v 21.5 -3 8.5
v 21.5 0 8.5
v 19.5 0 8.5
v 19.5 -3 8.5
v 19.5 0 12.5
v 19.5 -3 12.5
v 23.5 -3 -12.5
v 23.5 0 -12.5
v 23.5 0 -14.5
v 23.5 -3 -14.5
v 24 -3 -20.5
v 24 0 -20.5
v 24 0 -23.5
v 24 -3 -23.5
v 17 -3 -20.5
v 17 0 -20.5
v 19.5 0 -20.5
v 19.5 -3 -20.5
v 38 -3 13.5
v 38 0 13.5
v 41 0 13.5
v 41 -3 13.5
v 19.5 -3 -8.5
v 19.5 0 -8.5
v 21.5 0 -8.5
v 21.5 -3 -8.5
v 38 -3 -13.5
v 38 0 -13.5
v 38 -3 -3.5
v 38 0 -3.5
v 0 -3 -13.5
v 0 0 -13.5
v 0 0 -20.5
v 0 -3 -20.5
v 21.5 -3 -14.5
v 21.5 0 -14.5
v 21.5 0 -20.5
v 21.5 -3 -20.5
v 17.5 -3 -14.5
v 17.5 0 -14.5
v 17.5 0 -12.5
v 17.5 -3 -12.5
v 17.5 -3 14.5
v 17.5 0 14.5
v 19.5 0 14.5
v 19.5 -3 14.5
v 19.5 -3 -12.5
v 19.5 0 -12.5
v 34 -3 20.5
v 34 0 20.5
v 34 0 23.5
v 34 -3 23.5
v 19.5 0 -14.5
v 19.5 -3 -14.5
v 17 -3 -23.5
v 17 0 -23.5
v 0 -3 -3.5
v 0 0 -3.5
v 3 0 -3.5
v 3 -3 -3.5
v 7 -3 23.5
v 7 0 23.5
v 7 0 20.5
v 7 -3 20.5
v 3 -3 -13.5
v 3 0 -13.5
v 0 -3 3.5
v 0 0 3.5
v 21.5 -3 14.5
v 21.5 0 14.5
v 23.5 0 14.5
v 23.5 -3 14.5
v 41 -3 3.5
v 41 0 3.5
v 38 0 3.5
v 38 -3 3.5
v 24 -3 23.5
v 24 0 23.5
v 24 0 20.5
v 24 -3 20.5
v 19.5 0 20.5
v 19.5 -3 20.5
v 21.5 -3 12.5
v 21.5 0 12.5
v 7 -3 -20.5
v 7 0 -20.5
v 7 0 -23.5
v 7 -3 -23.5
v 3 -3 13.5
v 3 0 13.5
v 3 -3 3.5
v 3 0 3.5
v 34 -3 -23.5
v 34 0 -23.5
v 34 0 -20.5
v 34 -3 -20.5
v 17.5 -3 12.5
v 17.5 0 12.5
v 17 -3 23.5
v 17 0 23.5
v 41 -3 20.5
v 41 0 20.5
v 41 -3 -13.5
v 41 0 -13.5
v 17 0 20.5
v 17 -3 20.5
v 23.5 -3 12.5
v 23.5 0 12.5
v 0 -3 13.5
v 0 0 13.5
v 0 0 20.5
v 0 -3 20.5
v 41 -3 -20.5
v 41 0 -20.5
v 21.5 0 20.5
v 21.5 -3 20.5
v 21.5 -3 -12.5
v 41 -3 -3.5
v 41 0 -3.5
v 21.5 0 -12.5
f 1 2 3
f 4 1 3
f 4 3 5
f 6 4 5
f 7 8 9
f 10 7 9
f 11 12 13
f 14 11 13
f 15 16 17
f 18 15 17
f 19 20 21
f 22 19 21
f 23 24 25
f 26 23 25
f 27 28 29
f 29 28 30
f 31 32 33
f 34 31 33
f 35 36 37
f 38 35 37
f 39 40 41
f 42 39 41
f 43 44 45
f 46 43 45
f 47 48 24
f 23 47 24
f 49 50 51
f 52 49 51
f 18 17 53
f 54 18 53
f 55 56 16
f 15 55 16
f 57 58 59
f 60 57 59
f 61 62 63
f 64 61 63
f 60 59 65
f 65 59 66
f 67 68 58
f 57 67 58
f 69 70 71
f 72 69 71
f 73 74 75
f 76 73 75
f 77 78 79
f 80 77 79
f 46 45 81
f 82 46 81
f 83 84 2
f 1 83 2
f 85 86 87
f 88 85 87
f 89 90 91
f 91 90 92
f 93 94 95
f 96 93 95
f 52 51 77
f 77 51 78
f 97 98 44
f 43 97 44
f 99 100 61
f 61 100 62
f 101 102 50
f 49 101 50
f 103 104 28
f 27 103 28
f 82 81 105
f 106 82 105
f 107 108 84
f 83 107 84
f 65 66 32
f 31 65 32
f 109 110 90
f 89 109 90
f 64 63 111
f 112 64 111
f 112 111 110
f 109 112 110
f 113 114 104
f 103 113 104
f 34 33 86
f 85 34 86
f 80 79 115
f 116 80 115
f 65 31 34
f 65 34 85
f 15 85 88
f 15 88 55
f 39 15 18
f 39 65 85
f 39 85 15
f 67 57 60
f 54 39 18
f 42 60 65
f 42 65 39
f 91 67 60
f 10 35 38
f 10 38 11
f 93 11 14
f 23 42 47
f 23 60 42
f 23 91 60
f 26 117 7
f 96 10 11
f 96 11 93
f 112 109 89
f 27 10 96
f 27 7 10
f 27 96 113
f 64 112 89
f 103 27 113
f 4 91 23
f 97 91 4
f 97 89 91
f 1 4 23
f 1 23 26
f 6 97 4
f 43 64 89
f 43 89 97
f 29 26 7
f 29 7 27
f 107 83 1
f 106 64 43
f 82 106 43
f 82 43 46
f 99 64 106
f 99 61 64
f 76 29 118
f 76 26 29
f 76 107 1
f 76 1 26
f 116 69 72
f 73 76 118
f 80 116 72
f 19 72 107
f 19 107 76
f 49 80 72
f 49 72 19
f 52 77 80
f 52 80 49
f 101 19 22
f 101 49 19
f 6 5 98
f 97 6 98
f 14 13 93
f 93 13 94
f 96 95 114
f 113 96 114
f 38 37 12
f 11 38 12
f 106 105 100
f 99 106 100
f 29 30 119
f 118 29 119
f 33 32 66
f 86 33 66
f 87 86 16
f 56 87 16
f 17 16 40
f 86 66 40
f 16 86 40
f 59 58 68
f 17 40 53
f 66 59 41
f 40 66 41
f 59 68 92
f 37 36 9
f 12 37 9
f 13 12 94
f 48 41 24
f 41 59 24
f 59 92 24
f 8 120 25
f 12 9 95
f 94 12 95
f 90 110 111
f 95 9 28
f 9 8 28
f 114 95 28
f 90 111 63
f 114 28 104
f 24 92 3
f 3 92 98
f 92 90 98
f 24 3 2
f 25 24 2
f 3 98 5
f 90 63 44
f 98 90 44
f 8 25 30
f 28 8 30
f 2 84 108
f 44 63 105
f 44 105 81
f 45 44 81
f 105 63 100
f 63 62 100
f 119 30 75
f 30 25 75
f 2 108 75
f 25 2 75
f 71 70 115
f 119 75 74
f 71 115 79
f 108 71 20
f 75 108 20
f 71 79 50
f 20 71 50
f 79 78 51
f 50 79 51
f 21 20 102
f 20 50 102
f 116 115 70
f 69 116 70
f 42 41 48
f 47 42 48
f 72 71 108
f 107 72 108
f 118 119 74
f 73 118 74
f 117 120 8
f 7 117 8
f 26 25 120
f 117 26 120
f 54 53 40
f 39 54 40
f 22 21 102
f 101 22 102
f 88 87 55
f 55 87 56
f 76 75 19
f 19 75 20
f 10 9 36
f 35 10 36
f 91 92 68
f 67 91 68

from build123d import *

# Parameters (mm, degrees)
F1_DEPTH = 3


with BuildPart() as f1:
    # F0 (on Front) → F1 (new body)
    with BuildSketch(Plane.XZ):
        Polygon((0, 3.5), (0, 0), (0, -3.5), (3, -3.5), (3, -13.5), (0, -13.5), (0, -20.5), (7, -20.5), (7, -23.5), (17, -23.5), (17, -20.5), (19.5, -20.5), (19.5, -14.5), (17.5, -14.5), (17.5, -12.5), (19.5, -12.5), (19.5, -8.5), (21.5, -8.5), (21.5, -12.5), (23.5, -12.5), (23.5, -14.5), (21.5, -14.5), (21.5, -20.5), (24, -20.5), (24, -23.5), (34, -23.5), (34, -20.5), (41, -20.5), (41, -13.5), (38, -13.5), (38, -3.5), (41, -3.5), (41, 0), (41, 3.5), (38, 3.5), (38, 13.5), (41, 13.5), (41, 20.5), (34, 20.5), (34, 23.5), (24, 23.5), (24, 20.5), (21.5, 20.5), (21.5, 14.5), (23.5, 14.5), (23.5, 12.5), (21.5, 12.5), (21.5, 8.5), (19.5, 8.5), (19.5, 12.5), (17.5, 12.5), (17.5, 14.5), (19.5, 14.5), (19.5, 20.5), (17, 20.5), (17, 23.5), (7, 23.5), (7, 20.5), (0, 20.5), (0, 13.5), (3, 13.5), (3, 3.5), align=None)
    extrude(amount=F1_DEPTH)


solid = f1.part
